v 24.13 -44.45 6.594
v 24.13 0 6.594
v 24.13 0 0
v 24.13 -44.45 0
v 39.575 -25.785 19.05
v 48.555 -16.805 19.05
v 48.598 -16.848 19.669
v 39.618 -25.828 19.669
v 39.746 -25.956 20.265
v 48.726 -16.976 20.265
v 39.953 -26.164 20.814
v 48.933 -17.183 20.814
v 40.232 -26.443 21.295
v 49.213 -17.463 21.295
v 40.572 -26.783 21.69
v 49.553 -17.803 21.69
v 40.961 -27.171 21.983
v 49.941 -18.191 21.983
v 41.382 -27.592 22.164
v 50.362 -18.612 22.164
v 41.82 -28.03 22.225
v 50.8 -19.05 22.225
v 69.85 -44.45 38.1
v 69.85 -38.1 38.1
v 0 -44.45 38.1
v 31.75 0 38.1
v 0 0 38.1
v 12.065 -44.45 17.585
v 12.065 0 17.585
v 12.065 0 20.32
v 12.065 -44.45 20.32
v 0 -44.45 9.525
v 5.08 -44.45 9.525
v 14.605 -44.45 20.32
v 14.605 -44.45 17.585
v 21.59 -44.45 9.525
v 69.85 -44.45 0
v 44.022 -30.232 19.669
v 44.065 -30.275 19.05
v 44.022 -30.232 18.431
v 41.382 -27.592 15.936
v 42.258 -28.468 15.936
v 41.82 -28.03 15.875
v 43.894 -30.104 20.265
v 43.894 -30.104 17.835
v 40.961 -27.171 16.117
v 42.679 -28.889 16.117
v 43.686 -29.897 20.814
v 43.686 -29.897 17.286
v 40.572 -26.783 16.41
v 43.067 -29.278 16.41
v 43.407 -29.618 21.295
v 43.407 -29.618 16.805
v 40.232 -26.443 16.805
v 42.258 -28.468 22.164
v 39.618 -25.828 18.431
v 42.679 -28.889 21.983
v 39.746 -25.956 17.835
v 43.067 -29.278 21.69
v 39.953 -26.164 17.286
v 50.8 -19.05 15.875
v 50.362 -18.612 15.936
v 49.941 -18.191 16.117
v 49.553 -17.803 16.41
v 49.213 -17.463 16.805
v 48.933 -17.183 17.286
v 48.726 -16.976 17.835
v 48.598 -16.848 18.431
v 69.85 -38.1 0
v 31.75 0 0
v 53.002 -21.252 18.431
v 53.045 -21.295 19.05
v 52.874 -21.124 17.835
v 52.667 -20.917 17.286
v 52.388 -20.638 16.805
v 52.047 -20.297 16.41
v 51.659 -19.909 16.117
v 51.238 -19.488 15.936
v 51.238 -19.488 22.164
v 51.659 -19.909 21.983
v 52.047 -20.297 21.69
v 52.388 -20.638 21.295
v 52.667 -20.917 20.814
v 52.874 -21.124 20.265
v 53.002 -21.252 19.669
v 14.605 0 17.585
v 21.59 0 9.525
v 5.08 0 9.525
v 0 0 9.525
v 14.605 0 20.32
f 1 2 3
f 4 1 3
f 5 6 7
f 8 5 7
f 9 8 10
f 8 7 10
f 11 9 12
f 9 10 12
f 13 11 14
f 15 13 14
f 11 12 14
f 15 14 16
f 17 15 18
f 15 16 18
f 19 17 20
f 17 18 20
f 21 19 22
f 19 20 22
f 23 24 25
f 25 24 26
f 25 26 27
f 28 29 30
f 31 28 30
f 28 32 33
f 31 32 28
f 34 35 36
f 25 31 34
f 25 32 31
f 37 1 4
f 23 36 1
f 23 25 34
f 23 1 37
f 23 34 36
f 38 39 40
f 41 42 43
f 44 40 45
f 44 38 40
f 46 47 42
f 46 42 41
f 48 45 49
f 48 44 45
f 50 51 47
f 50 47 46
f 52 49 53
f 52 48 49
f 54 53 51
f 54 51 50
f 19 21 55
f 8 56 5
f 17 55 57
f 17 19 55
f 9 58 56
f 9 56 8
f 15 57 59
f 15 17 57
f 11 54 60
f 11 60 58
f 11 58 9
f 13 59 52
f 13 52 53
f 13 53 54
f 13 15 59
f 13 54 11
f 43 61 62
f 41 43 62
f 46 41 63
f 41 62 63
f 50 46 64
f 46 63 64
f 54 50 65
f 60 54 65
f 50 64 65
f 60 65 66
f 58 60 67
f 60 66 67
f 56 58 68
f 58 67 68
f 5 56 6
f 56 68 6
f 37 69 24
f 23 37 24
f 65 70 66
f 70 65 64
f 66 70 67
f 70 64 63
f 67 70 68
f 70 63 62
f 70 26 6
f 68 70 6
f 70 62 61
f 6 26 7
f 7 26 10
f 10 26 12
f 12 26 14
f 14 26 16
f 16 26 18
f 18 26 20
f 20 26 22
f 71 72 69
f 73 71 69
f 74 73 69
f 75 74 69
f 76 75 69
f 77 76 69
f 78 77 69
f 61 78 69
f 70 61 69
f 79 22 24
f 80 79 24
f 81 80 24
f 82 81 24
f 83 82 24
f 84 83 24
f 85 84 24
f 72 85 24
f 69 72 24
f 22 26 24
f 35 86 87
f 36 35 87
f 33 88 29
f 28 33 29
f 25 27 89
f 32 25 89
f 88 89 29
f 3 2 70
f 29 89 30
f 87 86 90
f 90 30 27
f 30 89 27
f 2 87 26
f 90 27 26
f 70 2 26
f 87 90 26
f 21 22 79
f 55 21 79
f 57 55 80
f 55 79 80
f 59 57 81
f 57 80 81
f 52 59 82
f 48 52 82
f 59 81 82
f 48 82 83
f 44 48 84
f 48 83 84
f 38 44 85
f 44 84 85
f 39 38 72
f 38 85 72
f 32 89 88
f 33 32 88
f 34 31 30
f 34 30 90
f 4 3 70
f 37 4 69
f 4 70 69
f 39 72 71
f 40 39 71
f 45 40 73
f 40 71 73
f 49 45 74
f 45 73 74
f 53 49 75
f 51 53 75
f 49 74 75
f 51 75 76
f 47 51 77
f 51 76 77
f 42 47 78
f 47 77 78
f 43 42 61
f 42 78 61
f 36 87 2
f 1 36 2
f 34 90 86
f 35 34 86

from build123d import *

# Parameters (mm, degrees)
F1_DEPTH = 44.45
F3_DEPTH = 38.1
F5_DEPTH = 12.7


with BuildPart() as f1:
    # F0 (on Front) → F1 (new body)
    with BuildSketch(Plane.XZ):
        Polygon((24.13, 6.594231), (24.13, 0), (69.85, 0), (69.85, 38.1), (0, 38.1), (0, 9.525), (5.08, 9.525), (12.065, 17.584615), (12.065, 19.05), (12.065, 20.32), (14.605, 20.32), (14.605, 19.05), (14.605, 17.584615), (21.59, 9.525), align=None)
    extrude(amount=F1_DEPTH)

    # F2 (on face) → F3 (cut)
    with BuildSketch(Plane.XY.offset(38.1)):
        Polygon((69.85, -38.1), (69.85, 0), (31.75, 0), align=None)
    extrude(amount=-F3_DEPTH, mode=Mode.SUBTRACT)

    # F4 (on face) → F5 (cut)
    with BuildSketch(Plane(origin=(15.875, 15.875, 0), x_dir=(-0.707107, 0.707107, 0), z_dir=(0.707107, 0.707107, 0))):
        with BuildLine():
            ThreePointArc((-49.391409, 22.225), (-51.636473, 21.295064), (-52.566409, 19.05))
            Line((-52.566409, 19.05), (-49.391409, 19.05))
            Line((-49.391409, 19.05), (-49.391409, 22.225))
        make_face()
        with BuildLine():
            Line((-49.391409, 19.05), (-52.566409, 19.05))
            ThreePointArc((-52.566409, 19.05), (-51.636473, 16.804936), (-49.391409, 15.875))
            Line((-49.391409, 15.875), (-49.391409, 19.05))
        make_face()
        with BuildLine():
            Line((-49.391409, 22.225), (-49.391409, 19.05))
            Line((-49.391409, 19.05), (-46.216409, 19.05))
            ThreePointArc((-46.216409, 19.05), (-47.146345, 21.295064), (-49.391409, 22.225))
        make_face()
        with BuildLine():
            Line((-46.216409, 19.05), (-49.391409, 19.05))
            Line((-49.391409, 19.05), (-49.391409, 15.875))
            ThreePointArc((-49.391409, 15.875), (-47.146345, 16.804936), (-46.216409, 19.05))
        make_face()
    extrude(amount=-F5_DEPTH, mode=Mode.SUBTRACT)


solid = f1.part
